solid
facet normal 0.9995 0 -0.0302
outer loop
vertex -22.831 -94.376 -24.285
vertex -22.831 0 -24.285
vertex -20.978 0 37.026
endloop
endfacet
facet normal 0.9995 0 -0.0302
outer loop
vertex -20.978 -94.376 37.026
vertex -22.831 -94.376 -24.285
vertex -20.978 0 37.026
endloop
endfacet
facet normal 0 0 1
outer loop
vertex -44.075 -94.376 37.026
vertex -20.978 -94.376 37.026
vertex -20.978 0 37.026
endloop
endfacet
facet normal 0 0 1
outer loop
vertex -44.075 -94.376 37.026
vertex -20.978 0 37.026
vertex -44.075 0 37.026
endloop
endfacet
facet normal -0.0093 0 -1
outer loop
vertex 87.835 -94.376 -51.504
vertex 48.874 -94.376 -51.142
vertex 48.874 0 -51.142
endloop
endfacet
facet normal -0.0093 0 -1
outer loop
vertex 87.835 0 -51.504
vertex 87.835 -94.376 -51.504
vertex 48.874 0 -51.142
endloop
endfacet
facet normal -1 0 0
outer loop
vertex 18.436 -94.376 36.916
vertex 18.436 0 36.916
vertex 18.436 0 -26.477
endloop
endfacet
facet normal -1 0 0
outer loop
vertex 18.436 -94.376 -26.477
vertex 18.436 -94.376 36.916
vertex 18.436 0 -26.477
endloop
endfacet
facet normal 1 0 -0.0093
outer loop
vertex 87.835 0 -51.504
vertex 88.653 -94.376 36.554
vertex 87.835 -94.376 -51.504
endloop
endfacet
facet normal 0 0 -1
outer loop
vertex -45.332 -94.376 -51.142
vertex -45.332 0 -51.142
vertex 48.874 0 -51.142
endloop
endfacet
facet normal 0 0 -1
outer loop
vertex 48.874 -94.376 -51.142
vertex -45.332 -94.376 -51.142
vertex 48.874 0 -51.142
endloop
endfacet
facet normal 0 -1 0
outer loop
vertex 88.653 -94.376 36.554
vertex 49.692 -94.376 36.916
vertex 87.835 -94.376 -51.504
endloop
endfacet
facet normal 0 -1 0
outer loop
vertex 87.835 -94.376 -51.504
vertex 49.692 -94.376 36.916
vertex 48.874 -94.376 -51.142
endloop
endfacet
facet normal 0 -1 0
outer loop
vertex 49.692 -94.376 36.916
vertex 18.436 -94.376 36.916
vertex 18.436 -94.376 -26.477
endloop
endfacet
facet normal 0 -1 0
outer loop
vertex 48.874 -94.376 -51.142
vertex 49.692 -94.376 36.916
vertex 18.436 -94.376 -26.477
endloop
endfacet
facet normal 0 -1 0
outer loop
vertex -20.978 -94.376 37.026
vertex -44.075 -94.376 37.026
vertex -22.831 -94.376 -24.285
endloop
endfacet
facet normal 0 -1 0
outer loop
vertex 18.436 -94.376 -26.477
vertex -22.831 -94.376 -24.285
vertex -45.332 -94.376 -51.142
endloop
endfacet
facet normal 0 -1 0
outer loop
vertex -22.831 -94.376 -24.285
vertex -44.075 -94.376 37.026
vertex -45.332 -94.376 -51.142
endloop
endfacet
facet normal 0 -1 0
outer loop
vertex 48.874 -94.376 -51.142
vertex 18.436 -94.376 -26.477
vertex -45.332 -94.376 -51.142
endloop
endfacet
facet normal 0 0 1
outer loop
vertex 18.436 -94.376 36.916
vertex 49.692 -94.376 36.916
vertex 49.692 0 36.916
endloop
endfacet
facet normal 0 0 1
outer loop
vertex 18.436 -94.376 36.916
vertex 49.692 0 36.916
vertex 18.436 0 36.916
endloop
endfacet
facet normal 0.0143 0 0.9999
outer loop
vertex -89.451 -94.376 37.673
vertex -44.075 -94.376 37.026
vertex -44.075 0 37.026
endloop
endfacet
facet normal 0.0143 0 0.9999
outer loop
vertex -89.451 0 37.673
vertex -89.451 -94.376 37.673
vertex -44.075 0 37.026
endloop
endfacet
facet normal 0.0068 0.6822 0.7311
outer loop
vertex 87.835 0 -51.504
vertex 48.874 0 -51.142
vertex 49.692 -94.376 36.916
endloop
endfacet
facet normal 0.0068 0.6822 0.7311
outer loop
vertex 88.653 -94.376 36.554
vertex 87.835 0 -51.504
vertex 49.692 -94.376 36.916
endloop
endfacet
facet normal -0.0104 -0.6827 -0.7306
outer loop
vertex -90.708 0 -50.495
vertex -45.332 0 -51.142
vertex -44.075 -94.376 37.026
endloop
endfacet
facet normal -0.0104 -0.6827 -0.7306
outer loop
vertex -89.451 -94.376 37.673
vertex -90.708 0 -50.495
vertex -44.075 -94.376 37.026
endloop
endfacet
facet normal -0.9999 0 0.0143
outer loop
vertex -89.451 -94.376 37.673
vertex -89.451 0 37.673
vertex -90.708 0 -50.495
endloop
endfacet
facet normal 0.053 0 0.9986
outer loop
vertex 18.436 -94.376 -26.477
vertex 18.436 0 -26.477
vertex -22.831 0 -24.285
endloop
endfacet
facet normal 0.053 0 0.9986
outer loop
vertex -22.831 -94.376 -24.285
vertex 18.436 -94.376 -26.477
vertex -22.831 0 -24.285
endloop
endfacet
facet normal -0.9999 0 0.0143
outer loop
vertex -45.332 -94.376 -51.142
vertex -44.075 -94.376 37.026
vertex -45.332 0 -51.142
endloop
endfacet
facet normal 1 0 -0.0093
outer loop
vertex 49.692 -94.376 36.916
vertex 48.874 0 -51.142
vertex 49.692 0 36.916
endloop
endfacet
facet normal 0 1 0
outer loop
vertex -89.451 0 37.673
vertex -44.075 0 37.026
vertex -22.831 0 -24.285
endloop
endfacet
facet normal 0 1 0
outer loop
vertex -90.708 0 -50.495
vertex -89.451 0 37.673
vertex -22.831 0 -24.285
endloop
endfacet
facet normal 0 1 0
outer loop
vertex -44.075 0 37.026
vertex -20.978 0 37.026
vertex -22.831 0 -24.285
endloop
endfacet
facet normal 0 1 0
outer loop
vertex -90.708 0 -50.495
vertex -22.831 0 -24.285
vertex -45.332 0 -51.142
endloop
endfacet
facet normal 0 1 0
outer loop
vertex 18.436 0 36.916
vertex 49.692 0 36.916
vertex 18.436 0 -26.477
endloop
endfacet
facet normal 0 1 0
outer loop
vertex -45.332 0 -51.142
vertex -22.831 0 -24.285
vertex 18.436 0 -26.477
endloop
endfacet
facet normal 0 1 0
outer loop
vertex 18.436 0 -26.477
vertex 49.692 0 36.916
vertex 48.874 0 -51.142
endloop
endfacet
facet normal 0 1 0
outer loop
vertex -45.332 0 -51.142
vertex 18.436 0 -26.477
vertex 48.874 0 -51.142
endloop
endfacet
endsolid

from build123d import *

# Parameters (mm, degrees)
F1_DEPTH = 94.3762343377
F3_DEPTH = 45.3802291304
F5_DEPTH = 38.9628577977


with BuildPart() as f1:
    # F0 (on Front) → F1 (new body)
    with BuildSketch(Plane.XZ):
        Polygon((-20.9776982665, 37.0258837938), (-44.0754815936, 37.0258837938), (-45.3320667148, -51.1417090893), (48.8735437393, -51.1417090893), (49.6917665005, 36.9159281254), (18.4360146523, 36.9159281254), (18.4360146523, -26.4765024185), (-22.8313431144, -24.2851227522), align=None)
    extrude(amount=F1_DEPTH)

    # F2 (on face) → F3 (join)
    with BuildSketch(Plane(origin=(-44.5941249017, 0, 0.635565881), x_dir=(0, -1, 0), z_dir=(-0.9998984524, 0, 0.0142507862))):
        Polygon((0, -51.7825333627), (94.3762343377, 36.394013638), (0, 36.394013638), align=None)
    extrude(amount=F3_DEPTH)

    # F4 (on face) → F5 (join)
    with BuildSketch(Plane(origin=(49.3444870134, 0, -0.45850404), x_dir=(0, 1, 0), z_dir=(0.9999568331, 0, -0.0092914989))):
        Polygon((0, -50.685392981), (-94.3762343377, 37.3760455736), (-94.3762343377, -50.685392981), align=None)
    extrude(amount=F5_DEPTH)


solid = f1.part
